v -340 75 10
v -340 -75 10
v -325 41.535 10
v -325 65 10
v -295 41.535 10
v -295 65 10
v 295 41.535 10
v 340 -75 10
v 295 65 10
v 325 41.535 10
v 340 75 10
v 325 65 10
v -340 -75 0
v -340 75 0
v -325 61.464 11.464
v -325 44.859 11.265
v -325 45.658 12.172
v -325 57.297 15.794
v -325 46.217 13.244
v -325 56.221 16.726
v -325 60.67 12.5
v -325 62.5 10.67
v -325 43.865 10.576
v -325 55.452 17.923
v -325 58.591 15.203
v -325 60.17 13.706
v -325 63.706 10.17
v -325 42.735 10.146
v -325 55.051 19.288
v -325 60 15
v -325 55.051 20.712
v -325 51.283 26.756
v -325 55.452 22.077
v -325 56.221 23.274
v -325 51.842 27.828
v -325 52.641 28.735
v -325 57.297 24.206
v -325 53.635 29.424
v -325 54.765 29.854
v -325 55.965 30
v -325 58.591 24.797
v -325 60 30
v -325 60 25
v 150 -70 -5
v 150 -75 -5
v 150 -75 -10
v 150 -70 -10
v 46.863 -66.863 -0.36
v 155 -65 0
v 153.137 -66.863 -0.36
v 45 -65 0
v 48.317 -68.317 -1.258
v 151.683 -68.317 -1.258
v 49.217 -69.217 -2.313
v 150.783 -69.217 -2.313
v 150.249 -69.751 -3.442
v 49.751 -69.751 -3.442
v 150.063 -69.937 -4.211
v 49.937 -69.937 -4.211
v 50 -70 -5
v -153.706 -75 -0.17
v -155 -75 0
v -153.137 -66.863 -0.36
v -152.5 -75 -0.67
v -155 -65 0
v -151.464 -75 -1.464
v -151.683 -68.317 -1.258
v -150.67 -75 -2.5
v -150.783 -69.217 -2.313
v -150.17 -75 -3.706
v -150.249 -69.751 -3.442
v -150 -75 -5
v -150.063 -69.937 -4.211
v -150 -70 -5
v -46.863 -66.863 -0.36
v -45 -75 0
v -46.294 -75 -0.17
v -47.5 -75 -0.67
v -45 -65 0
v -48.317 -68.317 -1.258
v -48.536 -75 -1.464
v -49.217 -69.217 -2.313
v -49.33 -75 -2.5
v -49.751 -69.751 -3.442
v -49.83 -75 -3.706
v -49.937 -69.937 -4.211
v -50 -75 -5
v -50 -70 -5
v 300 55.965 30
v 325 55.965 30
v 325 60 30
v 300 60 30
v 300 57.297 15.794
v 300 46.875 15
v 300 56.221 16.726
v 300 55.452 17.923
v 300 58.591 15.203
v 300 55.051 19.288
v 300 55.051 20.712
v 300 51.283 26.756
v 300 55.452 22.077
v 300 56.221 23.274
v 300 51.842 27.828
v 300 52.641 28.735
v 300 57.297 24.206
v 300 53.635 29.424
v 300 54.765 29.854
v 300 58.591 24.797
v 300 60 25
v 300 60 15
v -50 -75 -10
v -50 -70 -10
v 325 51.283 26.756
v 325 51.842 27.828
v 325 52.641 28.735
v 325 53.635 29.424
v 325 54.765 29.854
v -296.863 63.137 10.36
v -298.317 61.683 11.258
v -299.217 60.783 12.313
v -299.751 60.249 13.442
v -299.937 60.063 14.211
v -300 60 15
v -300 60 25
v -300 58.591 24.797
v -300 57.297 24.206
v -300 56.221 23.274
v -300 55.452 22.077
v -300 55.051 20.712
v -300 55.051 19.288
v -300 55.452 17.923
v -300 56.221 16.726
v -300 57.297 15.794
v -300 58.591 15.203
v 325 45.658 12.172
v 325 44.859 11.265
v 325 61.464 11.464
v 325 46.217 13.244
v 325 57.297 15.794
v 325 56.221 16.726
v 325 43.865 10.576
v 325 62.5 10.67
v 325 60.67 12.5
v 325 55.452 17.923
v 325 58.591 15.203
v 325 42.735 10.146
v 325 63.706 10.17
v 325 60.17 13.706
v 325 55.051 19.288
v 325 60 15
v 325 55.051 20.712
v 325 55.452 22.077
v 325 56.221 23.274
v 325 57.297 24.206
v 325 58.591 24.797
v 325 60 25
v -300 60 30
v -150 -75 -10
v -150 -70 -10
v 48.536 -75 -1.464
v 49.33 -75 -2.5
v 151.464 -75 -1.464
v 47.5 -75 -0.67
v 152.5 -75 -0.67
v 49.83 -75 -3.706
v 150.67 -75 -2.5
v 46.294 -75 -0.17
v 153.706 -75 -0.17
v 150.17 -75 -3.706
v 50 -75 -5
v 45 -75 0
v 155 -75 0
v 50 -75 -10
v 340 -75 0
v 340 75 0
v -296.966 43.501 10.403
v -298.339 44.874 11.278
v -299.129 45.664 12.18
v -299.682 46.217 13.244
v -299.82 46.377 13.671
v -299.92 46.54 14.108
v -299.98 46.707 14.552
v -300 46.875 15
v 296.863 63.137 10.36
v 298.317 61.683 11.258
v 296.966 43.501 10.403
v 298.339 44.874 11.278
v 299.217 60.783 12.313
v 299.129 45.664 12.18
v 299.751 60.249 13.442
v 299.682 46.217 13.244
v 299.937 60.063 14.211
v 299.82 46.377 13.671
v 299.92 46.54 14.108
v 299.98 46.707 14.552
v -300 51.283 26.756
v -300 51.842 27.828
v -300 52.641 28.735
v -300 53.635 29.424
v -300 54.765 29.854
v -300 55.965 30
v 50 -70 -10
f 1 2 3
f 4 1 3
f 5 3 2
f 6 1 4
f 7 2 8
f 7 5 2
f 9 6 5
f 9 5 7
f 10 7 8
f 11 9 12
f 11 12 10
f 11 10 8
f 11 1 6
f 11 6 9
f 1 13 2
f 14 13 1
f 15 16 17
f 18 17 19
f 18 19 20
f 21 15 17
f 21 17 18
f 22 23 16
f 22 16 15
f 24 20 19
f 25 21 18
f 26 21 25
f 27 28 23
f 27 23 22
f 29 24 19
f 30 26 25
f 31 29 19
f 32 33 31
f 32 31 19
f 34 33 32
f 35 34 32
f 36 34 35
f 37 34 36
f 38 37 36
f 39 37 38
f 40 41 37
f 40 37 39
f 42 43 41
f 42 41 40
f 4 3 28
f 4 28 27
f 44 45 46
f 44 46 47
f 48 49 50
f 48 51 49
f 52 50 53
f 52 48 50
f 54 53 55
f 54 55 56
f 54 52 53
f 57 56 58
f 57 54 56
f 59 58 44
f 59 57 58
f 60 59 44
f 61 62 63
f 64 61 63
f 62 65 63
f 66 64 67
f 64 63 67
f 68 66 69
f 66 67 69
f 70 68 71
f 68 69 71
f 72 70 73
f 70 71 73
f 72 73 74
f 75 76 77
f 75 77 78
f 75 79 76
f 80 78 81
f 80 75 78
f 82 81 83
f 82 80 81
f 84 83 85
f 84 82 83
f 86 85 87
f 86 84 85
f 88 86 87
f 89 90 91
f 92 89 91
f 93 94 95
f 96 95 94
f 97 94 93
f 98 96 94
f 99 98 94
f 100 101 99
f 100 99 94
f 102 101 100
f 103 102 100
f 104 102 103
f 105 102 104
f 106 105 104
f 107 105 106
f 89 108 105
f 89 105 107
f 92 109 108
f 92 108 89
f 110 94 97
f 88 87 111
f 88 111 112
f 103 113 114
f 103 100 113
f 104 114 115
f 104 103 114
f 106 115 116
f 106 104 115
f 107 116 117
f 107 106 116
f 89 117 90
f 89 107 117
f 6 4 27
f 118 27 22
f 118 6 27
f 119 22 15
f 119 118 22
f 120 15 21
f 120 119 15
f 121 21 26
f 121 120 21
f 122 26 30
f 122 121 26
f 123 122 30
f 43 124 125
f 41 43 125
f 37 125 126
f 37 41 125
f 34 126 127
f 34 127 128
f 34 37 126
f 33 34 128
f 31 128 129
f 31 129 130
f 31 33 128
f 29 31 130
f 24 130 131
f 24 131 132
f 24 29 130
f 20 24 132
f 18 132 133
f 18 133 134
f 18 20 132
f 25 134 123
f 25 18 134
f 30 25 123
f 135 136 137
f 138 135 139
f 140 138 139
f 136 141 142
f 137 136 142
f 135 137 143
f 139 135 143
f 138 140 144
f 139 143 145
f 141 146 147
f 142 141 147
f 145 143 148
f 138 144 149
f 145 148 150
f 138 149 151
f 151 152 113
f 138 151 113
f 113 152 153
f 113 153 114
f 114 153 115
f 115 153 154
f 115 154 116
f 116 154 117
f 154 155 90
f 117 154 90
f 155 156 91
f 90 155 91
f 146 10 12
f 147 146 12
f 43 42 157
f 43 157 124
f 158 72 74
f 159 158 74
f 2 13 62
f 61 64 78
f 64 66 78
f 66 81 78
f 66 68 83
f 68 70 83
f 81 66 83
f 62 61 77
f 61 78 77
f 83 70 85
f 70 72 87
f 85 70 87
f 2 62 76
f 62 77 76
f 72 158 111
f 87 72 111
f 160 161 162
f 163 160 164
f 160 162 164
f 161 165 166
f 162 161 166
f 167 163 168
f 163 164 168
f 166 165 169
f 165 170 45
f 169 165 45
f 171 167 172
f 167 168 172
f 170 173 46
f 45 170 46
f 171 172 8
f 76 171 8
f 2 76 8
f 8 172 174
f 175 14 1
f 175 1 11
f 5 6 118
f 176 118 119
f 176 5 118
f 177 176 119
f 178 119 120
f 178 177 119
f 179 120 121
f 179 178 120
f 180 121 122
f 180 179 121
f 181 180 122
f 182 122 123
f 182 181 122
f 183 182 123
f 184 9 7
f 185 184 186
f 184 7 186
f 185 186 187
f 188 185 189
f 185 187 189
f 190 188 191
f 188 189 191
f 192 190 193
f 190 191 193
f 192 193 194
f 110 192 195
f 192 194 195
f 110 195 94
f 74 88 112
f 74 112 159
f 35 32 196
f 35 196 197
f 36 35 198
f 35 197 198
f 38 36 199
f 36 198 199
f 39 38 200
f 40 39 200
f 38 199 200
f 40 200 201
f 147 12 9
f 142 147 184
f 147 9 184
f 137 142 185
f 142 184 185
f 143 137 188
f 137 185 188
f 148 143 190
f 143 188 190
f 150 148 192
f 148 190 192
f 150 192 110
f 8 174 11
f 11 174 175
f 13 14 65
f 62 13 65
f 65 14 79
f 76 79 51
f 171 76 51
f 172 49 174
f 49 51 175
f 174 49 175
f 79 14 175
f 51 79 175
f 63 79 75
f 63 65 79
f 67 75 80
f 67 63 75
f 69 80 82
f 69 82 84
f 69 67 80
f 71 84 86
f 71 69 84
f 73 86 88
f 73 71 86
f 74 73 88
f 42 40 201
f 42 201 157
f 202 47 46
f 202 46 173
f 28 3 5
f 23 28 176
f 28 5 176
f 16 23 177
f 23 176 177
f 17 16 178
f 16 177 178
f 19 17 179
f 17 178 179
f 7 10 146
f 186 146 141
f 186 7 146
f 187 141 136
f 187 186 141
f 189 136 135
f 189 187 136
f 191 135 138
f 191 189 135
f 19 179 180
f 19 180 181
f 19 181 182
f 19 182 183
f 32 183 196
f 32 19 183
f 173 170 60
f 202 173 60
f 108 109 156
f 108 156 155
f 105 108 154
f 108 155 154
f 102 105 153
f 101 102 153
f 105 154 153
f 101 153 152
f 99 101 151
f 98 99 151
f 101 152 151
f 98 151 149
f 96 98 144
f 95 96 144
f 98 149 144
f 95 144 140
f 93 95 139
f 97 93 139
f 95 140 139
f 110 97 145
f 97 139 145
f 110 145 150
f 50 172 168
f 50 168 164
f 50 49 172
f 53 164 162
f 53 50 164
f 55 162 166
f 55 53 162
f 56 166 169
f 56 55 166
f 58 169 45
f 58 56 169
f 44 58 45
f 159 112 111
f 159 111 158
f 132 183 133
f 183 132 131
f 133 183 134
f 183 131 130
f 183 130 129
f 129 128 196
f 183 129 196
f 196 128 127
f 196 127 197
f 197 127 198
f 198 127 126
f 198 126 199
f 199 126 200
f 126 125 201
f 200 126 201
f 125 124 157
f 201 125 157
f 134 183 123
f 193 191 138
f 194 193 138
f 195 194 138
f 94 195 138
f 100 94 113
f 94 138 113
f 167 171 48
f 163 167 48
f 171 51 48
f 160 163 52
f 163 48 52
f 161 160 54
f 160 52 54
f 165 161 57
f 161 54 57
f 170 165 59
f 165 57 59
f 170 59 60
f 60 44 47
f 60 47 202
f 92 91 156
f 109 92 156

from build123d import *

# Parameters (mm, degrees)
SKETCH1_W                                     = 680
SKETCH1_H                                     = 150
VERTICAL_PORTION_DEPTH                        = 10
SHAFT_ADAPTER_RIGHT_DEPTH                     = 25
SHAFT_ADAPTER_FILLETS_R                       = 5
SKETCH5_W                                     = 100
SKETCH5_H                                     = 5
LIMIT_TAB_PREVENTS_GATE_FROM_GETTING_PU_DEPTH = 10
LIMIT_TAB_FILLETS_R                           = 5


with BuildPart() as part:
    # Sketch1 → Vertical portion (new body)
    with BuildSketch(Plane.XY):
        Rectangle(SKETCH1_W, SKETCH1_H)
    extrude(amount=VERTICAL_PORTION_DEPTH)

    # Sketch4 → Shaft adapter right (add)
    with BuildSketch(Plane(origin=(325, 0, 0), x_dir=(0, 0, -1), z_dir=(1, 0, 0))):
        with BuildLine():
            Line((-10, 45), (-30, 52.5))
            Line((-30, 52.5), (-30, 60))
            Line((-30, 60), (-25, 60))
            ThreePointArc((-25, 60), (-20, 55), (-15, 60))
            Line((-15, 60), (-10, 60))
            Line((-10, 60), (-10, 55))
            Line((-10, 55), (-10, 45))
        make_face()
    shaft_adapter_right = extrude(amount=-SHAFT_ADAPTER_RIGHT_DEPTH)

    # Shaft adapter left: Shaft adapter right across plane
    add(shaft_adapter_right.mirror(Plane(origin=(0, 0, 0), x_dir=(0, 0, 1), z_dir=(1, 0, 0))))

    # Shaft adapter fillets
    shaft_adapter_fillets_edges = [part.edges().sort_by_distance(p)[0] for p in [
        (-312.5, 52.5, 30),
        (312.5, 52.5, 30),
        (300, 52.5, 10),
        (-300, 52.5, 10),
        (-312.5, 45, 10),
        (312.5, 45, 10),
        (312.5, 60, 10),
        (-312.5, 60, 10),
    ]]
    fillet(shaft_adapter_fillets_edges, radius=SHAFT_ADAPTER_FILLETS_R - 0.0001)  # a hair under: the kernel refuses the full size

    # Sketch5 → Limit tab (prevents gate from getting pushed out of slot) (add)
    with BuildSketch(Plane(origin=(0, 0, 0), x_dir=(-1, 0, 0), z_dir=(0, 0, -1))):
        with Locations((-100, -72.5)):
            Rectangle(SKETCH5_W, SKETCH5_H)
        with Locations((100, -72.5)):
            Rectangle(SKETCH5_W, SKETCH5_H)
    extrude(amount=LIMIT_TAB_PREVENTS_GATE_FROM_GETTING_PU_DEPTH)

    # Limit tab fillets
    limit_tab_fillets_edges = [part.edges().sort_by_distance(p)[0] for p in [
        (150, -72.5, 0),
        (50, -72.5, 0),
        (100, -70, 0),
        (-150, -72.5, 0),
        (-100, -70, 0),
        (-50, -72.5, 0),
    ]]
    fillet(limit_tab_fillets_edges, radius=LIMIT_TAB_FILLETS_R)


solid = part.part
